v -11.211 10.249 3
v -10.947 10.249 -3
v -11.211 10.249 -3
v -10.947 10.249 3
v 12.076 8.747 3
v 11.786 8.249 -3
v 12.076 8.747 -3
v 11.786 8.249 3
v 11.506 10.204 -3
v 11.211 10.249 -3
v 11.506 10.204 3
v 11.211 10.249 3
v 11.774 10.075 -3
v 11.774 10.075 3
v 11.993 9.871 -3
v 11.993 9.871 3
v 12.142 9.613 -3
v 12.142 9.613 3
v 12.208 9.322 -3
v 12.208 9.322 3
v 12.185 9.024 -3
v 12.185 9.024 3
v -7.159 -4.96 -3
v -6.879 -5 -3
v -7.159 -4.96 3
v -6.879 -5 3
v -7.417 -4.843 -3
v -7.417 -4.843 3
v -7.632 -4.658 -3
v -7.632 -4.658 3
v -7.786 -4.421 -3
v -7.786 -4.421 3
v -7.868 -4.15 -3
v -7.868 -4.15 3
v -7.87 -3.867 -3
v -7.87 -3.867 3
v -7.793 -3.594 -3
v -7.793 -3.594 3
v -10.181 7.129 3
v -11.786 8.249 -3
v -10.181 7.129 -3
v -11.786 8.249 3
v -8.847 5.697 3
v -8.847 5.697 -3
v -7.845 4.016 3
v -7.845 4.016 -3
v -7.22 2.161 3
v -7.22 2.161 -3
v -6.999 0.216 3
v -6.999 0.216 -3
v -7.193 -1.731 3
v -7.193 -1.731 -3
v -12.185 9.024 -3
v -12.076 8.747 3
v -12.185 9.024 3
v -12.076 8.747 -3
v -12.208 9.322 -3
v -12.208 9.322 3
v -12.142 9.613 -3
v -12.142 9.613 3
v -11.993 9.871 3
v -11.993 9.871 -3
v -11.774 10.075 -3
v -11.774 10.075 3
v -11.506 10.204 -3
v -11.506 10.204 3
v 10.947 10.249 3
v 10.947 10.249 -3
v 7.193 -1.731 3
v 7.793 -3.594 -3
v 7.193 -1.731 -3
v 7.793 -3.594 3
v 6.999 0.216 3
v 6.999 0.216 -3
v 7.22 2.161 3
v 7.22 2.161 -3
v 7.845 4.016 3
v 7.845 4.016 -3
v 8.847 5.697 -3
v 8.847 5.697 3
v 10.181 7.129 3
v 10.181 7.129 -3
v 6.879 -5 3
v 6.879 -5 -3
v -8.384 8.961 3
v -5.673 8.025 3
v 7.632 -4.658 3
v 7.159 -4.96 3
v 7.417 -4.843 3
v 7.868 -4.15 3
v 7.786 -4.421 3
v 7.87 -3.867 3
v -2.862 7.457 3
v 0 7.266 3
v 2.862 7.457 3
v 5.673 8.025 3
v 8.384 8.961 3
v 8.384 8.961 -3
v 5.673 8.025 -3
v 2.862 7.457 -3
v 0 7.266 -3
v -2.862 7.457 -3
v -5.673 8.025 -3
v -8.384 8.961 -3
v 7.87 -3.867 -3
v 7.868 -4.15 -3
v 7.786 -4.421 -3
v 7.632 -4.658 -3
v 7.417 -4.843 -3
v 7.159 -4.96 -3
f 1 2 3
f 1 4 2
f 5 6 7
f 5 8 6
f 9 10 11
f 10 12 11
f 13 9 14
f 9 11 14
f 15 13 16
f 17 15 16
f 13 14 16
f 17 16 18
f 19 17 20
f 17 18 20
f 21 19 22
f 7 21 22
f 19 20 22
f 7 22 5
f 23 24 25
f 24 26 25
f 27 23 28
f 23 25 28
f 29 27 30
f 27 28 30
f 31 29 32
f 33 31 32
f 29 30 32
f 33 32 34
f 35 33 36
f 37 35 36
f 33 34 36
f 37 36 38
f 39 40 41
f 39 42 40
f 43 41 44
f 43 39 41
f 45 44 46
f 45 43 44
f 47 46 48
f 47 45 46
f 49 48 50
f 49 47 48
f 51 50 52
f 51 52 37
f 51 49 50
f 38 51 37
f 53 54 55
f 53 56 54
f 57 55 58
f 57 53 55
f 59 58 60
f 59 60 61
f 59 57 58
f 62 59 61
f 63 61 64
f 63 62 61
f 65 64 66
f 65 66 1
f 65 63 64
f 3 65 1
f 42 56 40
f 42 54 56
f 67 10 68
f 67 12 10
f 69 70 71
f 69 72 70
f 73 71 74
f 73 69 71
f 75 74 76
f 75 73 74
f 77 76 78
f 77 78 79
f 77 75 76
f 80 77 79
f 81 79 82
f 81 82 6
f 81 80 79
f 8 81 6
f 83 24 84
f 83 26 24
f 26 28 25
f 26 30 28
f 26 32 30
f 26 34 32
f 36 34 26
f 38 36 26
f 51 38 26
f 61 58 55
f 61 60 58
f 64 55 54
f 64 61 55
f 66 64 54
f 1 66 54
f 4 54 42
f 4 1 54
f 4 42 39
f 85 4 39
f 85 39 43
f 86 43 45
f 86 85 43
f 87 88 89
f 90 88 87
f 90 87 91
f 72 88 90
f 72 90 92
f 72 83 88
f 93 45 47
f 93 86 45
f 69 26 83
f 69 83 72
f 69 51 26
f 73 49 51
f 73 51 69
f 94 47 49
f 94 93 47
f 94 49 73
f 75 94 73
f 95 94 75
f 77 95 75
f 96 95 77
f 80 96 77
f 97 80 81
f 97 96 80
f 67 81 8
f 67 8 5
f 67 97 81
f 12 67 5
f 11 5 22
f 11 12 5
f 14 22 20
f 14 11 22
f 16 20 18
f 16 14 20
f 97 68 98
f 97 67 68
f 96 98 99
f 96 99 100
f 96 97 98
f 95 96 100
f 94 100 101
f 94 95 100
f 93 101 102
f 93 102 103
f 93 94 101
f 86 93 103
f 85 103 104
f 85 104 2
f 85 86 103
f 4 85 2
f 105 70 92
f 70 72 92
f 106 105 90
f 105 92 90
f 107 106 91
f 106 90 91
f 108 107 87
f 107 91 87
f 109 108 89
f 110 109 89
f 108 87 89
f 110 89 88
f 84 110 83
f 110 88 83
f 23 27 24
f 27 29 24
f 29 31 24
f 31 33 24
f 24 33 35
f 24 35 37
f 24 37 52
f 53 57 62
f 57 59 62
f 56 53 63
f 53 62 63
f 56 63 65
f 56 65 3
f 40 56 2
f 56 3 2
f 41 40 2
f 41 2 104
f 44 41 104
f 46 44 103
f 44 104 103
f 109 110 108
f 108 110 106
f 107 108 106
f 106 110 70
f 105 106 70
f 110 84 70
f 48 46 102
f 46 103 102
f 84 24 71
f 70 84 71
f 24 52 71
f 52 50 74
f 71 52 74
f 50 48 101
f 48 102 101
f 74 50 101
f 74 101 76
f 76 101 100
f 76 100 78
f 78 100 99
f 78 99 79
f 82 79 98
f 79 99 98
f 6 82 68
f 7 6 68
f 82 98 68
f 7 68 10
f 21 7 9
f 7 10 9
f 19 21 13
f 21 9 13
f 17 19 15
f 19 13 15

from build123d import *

# Parameters (mm, degrees)
F1_DEPTH = 3
F2_R     = 1


# Not quite as in the source:
# - a feature names something its author has since deleted; it is built from what else it names


with BuildPart() as f1:
    # F0 (on Top) → F1 (new body, symmetric)
    with BuildSketch(Plane.XY):
        with BuildLine():
            Line((-12.9470113486, 10.248668018), (-11.7864680784, 8.248668018))
            ThreePointArc((-11.7864680784, 8.248668018), (-7.2595115052, 2.3329471863), (-8.5698451786, -5))
            Line((-8.5698451786, -5), (8.5698451786, -5))
            ThreePointArc((8.5698451786, -5), (7.2595115052, 2.3329471863), (11.7864680784, 8.248668018))
            Line((11.7864680784, 8.248668018), (12.9470113486, 10.248668018))
            Line((12.9470113486, 10.248668018), (10.9470113486, 10.248668018))
            ThreePointArc((10.9470113486, 10.248668018), (0, 7.2662124228), (-10.9470113486, 10.248668018))
            Line((-10.9470113486, 10.248668018), (-12.9470113486, 10.248668018))
        make_face()
    extrude(amount=F1_DEPTH, both=True)

    # F2
    f2_edges = [f1.edges().sort_by_distance(p)[0] for p in [
        (-12.947011, 10.248668, 0),
        (12.947011, 10.248668, 0),
        (-8.569845, -5, 0),
        (8.569845, -5, 0),
    ]]
    fillet(f2_edges, radius=F2_R)


solid = f1.part
